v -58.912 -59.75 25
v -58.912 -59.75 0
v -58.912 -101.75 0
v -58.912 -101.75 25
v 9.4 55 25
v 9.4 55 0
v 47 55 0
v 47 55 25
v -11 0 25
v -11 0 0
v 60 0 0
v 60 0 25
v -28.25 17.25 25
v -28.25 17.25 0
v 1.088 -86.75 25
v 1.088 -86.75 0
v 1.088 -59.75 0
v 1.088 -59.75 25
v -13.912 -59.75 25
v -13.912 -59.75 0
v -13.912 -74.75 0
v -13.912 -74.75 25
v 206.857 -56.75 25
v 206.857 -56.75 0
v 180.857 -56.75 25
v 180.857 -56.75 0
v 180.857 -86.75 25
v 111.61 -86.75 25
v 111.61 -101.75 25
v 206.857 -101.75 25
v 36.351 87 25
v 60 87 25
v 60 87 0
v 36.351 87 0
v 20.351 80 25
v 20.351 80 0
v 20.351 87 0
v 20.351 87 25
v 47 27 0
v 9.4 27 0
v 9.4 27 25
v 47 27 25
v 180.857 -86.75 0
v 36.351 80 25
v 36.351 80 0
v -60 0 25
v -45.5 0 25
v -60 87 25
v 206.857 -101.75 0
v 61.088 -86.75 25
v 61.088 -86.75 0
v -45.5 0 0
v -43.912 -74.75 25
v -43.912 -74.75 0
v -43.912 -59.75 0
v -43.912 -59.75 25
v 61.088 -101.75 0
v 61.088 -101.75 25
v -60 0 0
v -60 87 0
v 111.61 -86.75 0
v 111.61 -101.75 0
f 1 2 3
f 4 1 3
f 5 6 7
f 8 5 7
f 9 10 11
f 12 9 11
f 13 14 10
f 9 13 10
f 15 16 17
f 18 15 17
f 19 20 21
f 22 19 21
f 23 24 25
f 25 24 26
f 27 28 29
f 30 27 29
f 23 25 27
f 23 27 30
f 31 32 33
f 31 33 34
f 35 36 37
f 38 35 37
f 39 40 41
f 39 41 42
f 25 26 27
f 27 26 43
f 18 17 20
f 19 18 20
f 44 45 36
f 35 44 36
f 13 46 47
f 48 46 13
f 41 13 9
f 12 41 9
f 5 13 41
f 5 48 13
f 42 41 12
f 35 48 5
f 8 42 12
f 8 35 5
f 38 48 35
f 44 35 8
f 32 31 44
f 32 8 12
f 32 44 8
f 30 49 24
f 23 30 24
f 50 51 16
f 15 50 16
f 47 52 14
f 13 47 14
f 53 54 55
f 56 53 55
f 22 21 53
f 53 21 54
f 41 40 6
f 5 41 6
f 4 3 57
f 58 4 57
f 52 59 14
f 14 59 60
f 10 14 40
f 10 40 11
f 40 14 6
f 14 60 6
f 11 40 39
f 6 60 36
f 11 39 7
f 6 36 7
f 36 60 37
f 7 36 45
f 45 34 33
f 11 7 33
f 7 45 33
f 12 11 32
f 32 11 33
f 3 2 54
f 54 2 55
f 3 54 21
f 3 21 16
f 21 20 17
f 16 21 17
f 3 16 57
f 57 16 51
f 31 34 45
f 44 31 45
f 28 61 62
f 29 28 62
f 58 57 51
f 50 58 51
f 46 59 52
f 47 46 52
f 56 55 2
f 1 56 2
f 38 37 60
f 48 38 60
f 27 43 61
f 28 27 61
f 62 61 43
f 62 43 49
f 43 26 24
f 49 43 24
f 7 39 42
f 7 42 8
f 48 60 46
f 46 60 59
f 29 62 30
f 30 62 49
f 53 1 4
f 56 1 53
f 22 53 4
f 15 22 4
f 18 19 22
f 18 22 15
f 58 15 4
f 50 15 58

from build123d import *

# Parameters (mm, degrees)
F0_W     = 37.6
F0_H     = 28
F0_W_2   = 15
F0_H_2   = 26
F0_W_3   = 30
F0_W_4   = 14.5
F0_H_3   = 15
F0_W_5   = 17.25
F1_DEPTH = 25


with BuildPart() as f1:
    # F0 (on Top) → F1 (new body)
    with BuildSketch(Plane.XY):
        Polygon((-60, 61), (-60, 0), (-45.5, 0), (-28.25, 17.25), (-11, 0), (60, 0), (60, 87), (36.350874, 87), (36.350874, 80), (20.350874, 80), (20.350874, 87), (0, 87), (0, 61), (-15, 61), (-45, 61), align=None)
        with Locations((28.2, 41)):
            Rectangle(F0_W, F0_H, mode=Mode.SUBTRACT)
        with Locations((-52.5, 74)):
            Rectangle(F0_W_2, F0_H_2)
        with Locations((-30, 74)):
            Rectangle(F0_W_3, F0_H_2)
        with Locations((-7.5, 74)):
            Rectangle(F0_W_2, F0_H_2)
        Polygon((-43.911685, -59.75034), (-58.911685, -59.75034), (-58.911685, -86.75034), (-44.411685, -86.75034), (-27.161685, -86.75034), (-9.911685, -86.75034), (1.088315, -86.75034), (1.088315, -59.75034), (-13.911685, -59.75034), (-13.911685, -74.75034), (-43.911685, -74.75034), align=None)
        with Locations((-51.661685, -94.25034)):
            Rectangle(F0_W_4, F0_H_3)
        with Locations((-35.786685, -94.25034)):
            Rectangle(F0_W_5, F0_H_3)
        with Locations((-18.536685, -94.25034)):
            Rectangle(F0_W_5, F0_H_3)
        Polygon((1.088315, -86.75034), (-9.911685, -86.75034), (-9.911685, -101.75034), (10.488315, -101.75034), (25.088315, -101.75034), (41.088315, -101.75034), (48.088315, -101.75034), (61.088315, -101.75034), (61.088315, -86.75034), (48.088315, -86.75034), (41.088315, -86.75034), (25.088315, -86.75034), (10.488315, -86.75034), align=None)
        Polygon((111.609705, -86.750337), (111.609705, -101.750337), (133.490902, -101.750337), (142.500803, -101.750337), (167.728529, -101.750337), (196.560229, -101.750337), (206.857255, -101.750337), (206.857255, -86.750337), (196.560229, -86.750337), (180.857255, -86.750337), (167.728529, -86.750337), (142.500803, -86.750337), (133.490902, -86.750337), align=None)
        Polygon((180.857255, -71.750337), (180.857255, -86.750337), (196.560229, -86.750337), (206.857255, -86.750337), (206.857255, -71.750337), (206.857255, -56.750337), (180.857255, -56.750337), align=None)
    extrude(amount=F1_DEPTH)


solid = f1.part
